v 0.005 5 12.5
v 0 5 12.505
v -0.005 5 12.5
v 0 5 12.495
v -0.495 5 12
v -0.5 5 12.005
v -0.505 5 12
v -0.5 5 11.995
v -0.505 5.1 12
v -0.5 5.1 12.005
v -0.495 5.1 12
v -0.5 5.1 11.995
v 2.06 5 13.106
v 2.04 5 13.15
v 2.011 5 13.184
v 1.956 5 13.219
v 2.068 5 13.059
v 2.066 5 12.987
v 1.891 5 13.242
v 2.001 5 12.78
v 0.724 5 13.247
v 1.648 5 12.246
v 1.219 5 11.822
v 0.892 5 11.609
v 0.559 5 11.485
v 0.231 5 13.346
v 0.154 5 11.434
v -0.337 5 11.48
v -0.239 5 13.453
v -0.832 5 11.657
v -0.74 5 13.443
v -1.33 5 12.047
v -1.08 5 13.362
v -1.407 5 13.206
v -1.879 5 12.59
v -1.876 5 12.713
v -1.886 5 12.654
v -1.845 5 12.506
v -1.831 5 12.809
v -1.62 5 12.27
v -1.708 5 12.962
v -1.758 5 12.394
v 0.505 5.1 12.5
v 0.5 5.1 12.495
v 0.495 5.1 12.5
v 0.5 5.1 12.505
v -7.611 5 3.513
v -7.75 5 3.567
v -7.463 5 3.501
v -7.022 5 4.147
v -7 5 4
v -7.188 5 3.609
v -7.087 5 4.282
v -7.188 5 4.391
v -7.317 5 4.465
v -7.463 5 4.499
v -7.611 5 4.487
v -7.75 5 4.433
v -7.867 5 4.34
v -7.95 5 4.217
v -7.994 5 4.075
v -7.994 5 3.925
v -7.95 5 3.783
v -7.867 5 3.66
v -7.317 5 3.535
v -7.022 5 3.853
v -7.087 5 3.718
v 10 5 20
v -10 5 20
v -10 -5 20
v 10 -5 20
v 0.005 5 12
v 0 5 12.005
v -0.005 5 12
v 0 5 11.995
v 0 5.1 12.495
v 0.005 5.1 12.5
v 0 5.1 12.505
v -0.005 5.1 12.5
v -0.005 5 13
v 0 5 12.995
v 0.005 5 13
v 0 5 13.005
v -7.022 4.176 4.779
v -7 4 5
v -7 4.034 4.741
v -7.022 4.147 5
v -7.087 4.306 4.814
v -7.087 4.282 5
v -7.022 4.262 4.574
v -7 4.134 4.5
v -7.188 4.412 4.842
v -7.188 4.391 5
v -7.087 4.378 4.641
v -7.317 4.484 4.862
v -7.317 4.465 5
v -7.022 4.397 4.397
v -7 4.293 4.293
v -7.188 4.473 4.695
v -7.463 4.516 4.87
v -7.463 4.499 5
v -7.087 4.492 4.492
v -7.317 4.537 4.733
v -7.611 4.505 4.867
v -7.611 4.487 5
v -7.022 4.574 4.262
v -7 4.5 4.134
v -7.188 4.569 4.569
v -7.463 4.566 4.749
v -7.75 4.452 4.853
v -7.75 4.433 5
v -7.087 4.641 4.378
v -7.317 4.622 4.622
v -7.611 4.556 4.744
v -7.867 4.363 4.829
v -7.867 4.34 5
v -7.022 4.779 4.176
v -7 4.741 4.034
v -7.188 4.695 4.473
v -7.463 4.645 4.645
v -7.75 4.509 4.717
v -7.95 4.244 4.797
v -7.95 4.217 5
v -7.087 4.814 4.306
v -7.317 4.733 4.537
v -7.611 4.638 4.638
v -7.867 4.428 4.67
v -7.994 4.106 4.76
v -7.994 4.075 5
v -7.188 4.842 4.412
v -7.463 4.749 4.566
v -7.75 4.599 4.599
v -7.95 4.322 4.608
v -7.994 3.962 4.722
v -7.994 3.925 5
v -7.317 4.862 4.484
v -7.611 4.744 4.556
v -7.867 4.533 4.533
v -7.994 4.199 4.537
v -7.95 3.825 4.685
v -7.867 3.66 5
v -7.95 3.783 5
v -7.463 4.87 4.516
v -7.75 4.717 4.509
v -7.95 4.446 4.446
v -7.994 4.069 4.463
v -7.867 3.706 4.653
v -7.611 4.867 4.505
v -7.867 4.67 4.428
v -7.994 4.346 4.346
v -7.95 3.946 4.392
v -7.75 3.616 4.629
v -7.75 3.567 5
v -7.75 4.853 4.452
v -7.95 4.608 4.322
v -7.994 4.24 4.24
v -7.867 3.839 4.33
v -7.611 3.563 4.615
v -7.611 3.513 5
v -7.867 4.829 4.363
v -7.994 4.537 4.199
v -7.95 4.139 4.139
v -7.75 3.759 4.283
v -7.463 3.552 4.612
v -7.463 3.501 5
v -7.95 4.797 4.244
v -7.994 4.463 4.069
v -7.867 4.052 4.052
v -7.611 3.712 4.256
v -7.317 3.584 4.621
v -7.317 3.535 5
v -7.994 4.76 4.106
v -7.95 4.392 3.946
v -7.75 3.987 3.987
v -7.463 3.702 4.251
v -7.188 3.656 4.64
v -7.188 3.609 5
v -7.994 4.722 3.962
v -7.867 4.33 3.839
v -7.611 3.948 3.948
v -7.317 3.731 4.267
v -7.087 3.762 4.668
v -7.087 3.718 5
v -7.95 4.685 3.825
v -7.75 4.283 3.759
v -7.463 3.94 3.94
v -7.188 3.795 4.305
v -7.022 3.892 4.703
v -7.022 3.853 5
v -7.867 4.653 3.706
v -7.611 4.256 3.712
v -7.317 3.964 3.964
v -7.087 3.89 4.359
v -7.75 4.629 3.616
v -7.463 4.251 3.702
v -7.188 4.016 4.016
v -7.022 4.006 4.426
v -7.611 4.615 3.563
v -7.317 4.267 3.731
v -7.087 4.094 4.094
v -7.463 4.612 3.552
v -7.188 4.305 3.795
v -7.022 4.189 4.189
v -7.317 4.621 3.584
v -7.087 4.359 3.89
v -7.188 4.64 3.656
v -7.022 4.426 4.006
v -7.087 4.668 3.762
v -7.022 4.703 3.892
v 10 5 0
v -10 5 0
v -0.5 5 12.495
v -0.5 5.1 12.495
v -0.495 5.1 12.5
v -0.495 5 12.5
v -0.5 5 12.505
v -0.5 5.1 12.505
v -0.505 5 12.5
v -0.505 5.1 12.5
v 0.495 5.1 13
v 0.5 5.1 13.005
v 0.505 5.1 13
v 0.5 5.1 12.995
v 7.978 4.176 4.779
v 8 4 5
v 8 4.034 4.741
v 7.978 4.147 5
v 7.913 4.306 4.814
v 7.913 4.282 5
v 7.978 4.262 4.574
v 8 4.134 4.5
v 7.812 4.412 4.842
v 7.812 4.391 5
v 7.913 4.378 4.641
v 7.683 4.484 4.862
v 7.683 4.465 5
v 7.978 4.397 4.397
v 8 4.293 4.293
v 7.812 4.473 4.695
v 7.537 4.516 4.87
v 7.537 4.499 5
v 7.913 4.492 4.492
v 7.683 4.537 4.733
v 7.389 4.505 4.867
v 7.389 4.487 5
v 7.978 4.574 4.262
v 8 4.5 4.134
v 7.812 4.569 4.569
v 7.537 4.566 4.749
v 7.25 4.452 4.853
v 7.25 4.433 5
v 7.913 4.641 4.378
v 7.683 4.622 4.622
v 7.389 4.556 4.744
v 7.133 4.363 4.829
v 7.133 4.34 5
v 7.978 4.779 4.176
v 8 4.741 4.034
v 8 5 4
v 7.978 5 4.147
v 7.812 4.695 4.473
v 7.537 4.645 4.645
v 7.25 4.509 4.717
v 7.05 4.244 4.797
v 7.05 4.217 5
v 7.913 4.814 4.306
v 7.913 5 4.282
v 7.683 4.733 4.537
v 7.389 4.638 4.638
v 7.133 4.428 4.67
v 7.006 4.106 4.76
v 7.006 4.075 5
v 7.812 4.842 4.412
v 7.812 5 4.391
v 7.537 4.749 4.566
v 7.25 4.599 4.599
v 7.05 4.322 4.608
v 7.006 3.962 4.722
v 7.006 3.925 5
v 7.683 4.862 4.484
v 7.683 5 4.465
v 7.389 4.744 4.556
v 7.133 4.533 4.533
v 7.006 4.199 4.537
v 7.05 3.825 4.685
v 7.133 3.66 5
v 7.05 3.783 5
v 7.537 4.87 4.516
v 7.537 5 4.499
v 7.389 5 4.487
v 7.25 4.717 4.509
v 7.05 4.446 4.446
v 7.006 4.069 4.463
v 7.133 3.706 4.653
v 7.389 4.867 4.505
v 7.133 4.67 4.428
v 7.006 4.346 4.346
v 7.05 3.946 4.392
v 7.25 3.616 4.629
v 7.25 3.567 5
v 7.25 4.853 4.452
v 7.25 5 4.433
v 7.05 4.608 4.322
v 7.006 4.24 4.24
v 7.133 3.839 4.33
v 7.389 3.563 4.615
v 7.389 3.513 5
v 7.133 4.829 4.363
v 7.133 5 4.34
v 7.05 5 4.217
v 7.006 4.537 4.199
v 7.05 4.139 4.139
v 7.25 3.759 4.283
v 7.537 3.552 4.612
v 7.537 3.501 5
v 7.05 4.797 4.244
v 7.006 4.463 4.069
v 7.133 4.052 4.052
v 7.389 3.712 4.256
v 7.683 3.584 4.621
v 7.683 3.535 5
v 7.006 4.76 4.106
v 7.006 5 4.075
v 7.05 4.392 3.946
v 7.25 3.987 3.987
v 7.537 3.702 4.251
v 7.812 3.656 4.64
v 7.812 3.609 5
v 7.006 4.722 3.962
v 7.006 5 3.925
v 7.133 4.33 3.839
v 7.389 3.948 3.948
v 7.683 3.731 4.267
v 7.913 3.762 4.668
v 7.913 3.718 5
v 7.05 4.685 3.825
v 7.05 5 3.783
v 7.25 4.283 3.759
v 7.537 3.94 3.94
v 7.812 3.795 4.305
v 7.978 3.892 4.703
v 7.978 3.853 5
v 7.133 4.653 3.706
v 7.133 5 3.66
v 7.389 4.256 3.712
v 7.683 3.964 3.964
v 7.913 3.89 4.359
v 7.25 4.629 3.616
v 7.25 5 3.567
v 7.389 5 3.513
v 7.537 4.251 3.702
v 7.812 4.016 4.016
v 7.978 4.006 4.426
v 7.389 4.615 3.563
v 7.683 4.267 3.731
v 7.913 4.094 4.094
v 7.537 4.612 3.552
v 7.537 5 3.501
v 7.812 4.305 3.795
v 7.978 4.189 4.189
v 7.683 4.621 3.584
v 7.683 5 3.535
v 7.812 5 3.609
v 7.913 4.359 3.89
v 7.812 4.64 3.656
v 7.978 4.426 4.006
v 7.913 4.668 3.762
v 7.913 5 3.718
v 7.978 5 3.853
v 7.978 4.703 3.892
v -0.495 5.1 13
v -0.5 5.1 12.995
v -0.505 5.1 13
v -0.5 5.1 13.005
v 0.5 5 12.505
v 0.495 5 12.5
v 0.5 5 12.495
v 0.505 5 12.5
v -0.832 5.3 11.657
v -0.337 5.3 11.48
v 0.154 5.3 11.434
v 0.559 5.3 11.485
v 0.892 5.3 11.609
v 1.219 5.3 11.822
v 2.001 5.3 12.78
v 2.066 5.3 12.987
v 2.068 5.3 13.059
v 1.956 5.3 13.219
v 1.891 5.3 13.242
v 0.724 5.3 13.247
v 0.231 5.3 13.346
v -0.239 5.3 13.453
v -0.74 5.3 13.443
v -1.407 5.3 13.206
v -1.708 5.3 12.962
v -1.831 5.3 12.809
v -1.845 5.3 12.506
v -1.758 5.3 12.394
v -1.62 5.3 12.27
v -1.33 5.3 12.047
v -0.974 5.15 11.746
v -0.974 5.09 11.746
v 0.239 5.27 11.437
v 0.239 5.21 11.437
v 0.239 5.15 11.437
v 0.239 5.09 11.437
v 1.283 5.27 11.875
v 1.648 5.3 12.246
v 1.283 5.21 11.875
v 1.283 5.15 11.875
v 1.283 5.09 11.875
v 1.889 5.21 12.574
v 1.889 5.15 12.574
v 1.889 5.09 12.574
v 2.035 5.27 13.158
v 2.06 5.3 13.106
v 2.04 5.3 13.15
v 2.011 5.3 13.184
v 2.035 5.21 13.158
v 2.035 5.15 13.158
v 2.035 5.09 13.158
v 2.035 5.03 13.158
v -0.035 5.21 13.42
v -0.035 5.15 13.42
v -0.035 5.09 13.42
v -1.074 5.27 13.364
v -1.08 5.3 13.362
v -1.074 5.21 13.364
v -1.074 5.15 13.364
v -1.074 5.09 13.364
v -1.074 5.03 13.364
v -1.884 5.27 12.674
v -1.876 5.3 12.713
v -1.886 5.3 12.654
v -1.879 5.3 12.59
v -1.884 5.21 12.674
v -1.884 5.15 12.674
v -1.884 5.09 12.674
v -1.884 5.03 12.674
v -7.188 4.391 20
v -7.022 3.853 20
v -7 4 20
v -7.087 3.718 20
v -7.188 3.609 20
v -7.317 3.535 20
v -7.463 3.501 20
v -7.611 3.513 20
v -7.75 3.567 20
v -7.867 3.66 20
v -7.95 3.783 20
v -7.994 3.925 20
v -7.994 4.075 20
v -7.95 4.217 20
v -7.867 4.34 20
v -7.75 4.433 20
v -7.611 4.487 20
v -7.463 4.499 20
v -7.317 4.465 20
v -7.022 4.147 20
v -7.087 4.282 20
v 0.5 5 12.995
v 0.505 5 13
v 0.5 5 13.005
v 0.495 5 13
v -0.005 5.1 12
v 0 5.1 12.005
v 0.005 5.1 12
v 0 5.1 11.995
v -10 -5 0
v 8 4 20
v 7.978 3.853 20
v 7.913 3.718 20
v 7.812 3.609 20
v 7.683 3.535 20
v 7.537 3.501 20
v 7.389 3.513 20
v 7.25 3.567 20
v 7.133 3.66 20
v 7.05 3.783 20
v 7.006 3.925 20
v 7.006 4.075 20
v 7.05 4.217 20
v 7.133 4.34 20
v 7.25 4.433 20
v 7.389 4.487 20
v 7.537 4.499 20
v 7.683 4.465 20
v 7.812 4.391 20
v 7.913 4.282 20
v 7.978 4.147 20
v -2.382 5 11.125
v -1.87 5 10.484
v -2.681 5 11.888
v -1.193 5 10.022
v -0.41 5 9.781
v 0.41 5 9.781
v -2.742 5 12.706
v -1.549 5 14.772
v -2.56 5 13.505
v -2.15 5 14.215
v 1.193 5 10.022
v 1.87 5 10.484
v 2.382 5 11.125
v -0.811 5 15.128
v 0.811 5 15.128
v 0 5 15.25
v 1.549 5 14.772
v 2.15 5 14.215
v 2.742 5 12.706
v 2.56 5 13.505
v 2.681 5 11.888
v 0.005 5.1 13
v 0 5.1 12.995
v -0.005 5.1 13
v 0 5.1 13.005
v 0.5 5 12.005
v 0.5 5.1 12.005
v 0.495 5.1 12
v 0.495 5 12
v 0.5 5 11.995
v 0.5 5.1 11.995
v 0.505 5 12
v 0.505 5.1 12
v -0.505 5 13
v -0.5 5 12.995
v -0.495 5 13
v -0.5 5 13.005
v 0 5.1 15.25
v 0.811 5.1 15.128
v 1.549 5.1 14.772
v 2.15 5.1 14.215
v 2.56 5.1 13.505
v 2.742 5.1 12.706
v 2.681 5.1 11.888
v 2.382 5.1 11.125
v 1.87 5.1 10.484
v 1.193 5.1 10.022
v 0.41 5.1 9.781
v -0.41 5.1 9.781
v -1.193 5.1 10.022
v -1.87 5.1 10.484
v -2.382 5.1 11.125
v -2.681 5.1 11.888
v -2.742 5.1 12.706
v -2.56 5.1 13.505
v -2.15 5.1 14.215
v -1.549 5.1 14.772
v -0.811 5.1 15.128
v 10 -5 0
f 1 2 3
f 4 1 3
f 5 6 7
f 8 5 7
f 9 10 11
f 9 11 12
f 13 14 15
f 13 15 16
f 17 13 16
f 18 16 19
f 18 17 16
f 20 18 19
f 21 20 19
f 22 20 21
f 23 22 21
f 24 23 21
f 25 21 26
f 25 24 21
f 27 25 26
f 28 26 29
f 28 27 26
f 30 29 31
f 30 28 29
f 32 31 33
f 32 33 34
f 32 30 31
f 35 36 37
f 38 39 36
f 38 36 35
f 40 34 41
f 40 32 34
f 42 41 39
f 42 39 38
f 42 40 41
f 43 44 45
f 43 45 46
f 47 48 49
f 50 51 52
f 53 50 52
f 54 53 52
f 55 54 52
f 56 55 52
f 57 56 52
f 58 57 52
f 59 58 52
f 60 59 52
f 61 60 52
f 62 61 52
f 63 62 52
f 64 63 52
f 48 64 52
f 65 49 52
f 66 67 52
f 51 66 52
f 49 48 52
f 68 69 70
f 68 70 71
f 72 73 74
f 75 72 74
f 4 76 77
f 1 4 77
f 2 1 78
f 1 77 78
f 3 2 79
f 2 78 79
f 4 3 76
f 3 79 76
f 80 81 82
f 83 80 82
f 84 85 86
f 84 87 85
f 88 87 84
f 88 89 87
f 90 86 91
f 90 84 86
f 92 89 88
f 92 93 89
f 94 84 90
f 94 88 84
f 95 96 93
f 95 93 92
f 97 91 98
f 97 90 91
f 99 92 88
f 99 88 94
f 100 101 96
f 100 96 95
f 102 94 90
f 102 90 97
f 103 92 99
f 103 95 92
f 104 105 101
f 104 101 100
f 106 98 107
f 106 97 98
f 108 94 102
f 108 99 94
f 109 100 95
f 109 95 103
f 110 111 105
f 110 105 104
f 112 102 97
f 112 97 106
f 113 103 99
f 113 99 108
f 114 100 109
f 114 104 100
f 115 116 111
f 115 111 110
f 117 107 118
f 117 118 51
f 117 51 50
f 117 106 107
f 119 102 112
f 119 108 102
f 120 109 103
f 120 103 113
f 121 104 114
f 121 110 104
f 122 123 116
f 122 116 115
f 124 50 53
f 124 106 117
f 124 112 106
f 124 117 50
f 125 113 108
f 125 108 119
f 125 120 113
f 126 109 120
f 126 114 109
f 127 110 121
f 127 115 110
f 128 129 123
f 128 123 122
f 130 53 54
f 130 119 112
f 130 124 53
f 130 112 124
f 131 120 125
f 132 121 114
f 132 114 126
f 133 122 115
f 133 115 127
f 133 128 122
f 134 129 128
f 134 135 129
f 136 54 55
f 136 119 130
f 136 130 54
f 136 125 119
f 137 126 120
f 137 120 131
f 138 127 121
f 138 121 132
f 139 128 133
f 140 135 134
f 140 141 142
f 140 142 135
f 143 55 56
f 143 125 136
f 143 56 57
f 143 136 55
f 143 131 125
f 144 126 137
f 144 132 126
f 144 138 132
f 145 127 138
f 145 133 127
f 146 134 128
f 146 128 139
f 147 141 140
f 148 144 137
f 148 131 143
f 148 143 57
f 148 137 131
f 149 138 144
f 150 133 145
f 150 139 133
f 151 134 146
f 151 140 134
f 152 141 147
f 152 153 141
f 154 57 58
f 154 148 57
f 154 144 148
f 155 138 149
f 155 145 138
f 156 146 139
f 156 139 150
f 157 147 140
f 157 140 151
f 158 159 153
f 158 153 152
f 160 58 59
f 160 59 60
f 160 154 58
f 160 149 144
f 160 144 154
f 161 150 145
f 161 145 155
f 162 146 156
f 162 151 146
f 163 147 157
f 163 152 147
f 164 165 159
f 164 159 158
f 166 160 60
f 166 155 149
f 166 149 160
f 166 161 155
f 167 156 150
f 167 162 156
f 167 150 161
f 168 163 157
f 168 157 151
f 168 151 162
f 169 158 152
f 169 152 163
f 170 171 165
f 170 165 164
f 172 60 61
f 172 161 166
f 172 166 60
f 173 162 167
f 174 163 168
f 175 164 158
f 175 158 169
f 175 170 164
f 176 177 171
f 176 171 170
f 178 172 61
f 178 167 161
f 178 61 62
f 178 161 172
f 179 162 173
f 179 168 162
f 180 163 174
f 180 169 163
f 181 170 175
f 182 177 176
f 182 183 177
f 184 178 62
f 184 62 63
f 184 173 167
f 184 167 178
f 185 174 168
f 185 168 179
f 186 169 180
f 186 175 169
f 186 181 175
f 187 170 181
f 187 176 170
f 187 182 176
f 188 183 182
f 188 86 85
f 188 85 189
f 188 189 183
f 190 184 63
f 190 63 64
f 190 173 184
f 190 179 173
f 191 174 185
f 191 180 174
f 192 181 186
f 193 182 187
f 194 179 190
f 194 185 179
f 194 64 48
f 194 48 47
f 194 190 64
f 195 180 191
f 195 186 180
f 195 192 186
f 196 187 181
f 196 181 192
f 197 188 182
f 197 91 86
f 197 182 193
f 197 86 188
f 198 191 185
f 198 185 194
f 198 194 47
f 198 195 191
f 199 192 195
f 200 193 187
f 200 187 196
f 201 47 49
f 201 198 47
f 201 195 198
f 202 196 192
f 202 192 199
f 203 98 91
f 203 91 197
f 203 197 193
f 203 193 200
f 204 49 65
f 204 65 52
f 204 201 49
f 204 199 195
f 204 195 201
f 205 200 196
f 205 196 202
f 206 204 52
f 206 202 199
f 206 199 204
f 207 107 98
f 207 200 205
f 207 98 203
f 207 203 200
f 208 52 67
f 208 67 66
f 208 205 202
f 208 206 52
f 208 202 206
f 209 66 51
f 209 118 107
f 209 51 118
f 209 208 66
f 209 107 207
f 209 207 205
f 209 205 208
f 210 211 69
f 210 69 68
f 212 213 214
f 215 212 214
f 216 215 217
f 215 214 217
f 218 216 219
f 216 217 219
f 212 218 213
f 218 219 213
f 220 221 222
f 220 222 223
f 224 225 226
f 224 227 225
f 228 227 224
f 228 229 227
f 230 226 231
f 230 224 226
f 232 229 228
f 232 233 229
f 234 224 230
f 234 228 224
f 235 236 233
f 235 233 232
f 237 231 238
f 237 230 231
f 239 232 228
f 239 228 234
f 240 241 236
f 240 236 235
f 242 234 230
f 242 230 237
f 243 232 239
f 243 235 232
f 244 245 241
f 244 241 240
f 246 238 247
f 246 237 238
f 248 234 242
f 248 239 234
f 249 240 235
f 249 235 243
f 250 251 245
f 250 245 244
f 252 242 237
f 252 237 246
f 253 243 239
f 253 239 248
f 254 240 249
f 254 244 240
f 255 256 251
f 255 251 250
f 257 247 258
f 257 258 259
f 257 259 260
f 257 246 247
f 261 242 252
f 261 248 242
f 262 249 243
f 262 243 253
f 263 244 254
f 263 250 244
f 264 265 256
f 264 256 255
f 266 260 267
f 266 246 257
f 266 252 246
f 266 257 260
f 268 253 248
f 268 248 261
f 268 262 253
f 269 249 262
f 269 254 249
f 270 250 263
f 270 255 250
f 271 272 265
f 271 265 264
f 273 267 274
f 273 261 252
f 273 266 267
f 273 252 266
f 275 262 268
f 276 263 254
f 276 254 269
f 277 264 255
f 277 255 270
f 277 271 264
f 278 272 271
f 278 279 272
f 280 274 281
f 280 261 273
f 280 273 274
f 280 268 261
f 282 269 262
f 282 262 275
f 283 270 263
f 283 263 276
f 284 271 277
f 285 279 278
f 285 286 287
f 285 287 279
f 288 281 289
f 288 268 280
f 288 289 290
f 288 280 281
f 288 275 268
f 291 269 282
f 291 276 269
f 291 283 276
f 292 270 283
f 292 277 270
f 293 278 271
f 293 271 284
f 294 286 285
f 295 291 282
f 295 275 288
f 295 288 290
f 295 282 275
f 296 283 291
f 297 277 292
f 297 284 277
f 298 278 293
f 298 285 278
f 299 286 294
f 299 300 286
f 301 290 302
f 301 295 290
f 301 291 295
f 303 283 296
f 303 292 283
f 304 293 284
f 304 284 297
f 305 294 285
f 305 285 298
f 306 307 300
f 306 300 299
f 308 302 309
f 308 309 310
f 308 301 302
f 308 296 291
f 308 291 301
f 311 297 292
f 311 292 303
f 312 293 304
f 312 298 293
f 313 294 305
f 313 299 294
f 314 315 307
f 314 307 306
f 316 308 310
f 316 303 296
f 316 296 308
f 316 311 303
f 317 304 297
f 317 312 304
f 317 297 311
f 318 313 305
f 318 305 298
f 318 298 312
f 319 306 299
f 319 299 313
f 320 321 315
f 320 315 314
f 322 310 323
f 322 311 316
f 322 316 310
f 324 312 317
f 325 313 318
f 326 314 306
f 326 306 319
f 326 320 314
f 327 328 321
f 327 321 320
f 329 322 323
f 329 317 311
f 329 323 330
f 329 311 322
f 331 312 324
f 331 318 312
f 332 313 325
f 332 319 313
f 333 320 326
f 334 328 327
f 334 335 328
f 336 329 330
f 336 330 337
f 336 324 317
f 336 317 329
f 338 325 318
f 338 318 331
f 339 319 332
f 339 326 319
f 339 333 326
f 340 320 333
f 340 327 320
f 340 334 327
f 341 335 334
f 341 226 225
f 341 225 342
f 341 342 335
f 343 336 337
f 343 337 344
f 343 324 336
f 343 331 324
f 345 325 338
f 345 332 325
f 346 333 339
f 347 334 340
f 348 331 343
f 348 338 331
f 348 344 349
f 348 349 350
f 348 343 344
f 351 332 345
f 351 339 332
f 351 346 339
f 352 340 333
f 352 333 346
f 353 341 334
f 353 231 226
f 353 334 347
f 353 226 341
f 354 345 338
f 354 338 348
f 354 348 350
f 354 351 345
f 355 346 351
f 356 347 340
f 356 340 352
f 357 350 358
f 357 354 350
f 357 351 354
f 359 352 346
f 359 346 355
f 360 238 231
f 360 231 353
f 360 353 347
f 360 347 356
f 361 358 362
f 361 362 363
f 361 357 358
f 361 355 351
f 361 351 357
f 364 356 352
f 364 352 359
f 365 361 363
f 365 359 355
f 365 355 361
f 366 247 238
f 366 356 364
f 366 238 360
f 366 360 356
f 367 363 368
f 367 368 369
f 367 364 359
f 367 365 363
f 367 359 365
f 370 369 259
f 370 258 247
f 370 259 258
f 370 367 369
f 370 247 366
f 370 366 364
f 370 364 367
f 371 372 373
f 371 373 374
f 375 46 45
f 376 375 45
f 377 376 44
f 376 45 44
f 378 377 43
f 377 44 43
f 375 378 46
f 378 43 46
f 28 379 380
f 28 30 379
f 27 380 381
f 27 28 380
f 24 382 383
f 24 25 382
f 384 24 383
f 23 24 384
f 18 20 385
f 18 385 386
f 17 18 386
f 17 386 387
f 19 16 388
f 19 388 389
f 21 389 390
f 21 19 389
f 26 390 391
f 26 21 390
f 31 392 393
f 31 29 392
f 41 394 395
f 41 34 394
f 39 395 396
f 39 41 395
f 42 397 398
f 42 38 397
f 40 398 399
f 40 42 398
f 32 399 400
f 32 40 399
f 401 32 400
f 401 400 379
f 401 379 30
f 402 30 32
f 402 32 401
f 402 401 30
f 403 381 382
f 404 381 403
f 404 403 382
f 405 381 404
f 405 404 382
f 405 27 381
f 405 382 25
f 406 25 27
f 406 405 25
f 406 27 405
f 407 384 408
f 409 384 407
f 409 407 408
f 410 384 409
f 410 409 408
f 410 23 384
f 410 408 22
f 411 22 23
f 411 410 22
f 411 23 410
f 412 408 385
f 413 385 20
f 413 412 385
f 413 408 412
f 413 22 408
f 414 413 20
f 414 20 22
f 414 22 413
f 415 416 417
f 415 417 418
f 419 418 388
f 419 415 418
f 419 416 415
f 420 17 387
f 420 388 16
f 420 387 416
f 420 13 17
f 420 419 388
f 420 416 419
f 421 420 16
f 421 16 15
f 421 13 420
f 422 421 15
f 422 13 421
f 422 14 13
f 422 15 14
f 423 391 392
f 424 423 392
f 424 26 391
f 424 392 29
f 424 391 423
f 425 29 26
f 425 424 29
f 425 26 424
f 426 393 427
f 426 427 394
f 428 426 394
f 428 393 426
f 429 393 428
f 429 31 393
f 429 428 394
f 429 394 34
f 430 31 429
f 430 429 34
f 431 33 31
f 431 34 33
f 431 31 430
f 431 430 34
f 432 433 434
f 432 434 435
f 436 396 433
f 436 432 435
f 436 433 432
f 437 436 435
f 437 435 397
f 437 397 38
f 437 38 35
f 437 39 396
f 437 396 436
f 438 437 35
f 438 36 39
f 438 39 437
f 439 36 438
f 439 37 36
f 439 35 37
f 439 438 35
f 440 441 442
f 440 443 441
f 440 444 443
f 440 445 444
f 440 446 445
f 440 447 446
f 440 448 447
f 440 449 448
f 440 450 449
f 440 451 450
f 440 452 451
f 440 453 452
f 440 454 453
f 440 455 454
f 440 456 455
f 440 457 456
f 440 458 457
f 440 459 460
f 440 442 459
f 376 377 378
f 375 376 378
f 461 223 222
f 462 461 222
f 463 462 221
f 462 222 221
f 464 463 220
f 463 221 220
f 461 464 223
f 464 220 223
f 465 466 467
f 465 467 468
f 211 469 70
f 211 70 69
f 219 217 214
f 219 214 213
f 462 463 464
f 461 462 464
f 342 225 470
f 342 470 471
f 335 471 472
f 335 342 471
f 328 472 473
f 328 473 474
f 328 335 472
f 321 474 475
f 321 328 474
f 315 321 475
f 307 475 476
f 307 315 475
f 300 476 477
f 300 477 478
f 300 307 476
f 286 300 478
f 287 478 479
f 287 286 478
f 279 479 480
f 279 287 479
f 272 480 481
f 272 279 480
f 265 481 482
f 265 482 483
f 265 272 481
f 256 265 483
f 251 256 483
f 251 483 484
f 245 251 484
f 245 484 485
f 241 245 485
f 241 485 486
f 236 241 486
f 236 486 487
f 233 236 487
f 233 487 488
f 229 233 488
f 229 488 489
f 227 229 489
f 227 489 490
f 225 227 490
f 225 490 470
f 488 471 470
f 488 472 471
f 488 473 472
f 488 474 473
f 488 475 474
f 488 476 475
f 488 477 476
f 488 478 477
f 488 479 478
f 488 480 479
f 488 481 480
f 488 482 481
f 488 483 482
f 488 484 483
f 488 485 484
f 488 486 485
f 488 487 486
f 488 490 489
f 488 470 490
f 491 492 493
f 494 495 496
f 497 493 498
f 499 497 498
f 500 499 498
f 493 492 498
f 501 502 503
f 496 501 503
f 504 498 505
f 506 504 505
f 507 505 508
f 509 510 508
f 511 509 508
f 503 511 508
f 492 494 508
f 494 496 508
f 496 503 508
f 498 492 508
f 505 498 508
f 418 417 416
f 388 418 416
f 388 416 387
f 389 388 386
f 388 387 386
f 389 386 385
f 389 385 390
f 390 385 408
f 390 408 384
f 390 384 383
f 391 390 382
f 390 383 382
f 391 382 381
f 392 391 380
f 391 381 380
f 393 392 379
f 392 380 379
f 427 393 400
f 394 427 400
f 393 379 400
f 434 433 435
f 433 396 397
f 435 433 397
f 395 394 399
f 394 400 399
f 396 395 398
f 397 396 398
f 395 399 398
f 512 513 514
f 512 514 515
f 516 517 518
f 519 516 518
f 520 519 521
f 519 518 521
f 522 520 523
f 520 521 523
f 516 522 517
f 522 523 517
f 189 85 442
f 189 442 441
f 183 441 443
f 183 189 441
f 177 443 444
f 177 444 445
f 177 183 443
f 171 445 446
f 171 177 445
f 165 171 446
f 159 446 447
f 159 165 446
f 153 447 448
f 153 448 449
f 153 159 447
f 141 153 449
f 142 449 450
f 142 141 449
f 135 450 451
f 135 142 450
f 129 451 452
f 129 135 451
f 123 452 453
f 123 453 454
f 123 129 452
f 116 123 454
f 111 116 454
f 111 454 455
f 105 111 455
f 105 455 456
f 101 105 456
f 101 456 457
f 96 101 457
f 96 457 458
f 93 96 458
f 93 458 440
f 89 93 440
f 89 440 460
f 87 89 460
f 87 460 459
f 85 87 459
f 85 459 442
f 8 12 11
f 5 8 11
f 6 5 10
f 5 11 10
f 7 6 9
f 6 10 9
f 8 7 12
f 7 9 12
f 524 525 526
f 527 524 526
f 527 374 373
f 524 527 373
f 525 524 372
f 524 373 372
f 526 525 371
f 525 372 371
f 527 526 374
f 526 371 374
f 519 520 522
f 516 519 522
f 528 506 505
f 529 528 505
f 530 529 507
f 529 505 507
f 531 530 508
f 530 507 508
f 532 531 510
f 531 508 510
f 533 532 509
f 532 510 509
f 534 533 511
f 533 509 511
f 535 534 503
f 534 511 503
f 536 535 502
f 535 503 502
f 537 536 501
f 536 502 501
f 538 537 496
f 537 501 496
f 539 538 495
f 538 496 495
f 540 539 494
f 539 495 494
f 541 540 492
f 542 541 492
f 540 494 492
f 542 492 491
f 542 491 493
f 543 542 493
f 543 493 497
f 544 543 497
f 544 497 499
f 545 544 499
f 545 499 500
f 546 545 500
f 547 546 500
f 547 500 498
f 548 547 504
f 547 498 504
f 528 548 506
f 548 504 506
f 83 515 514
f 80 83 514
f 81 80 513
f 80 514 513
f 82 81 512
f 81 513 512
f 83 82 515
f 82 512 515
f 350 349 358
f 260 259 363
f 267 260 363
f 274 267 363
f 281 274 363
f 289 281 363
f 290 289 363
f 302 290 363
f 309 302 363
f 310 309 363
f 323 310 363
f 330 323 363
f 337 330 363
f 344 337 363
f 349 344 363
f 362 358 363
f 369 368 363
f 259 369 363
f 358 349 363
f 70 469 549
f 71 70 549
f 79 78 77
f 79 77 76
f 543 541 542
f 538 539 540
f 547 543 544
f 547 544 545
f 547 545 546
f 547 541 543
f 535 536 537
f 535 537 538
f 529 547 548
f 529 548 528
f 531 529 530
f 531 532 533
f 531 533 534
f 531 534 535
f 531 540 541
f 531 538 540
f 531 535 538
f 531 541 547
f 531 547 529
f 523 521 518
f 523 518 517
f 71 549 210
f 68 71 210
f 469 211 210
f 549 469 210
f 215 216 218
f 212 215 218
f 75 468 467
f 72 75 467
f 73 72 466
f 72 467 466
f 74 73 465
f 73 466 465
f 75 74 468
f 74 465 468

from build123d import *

# Parameters (mm, degrees)
SKETCH1_W             = 20
SKETCH1_H             = 10
BOSS_EXTRUDE1_DEPTH   = 20
SKETCH2_R             = 0.5
SKETCH5_R             = 2.75
BOSS_EXTRUDE4_DEPTH   = 0.1
SKETCH8_R             = 0.005
BOSS_EXTRUDE5_DEPTH   = 0.1
BOSS_EXTRUDE5_2_DEPTH = 0.1
BOSS_EXTRUDE5_3_DEPTH = 0.1
BOSS_EXTRUDE5_4_DEPTH = 0.1
BOSS_EXTRUDE5_5_DEPTH = 0.1
BOSS_EXTRUDE5_6_DEPTH = 0.1
BOSS_EXTRUDE5_7_DEPTH = 0.1
BOSS_EXTRUDE5_8_DEPTH = 0.1
BOSS_EXTRUDE5_9_DEPTH = 0.1
SLICE_2_DEPTH         = 0.3


with BuildPart() as part:
    # Sketch1 → Boss-Extrude1 (new body)
    with BuildSketch(Plane.XY):
        Rectangle(SKETCH1_W, SKETCH1_H)
    extrude(amount=BOSS_EXTRUDE1_DEPTH)


with BuildPart() as body_2:
    # ag/agcl electrodes: sweep along a path in Sketch3
    with BuildLine(Plane(origin=(7.5, 0, 0), x_dir=(0, 0, -1), z_dir=(1, 0, 0))) as ag_agcl_electrodes_path:
        Line((-20, 4), (-5, 4))
        ThreePointArc((-5, 4), (-4.292893219, 4.292893219), (-4, 5))
    # Sketch2 → ag/agcl electrodes (sweep)
    with BuildSketch(Plane.XY.offset(20)):
        with Locations((-7.5, 4)):
            Circle(SKETCH2_R)
        with Locations((7.5, 4)):
            Circle(SKETCH2_R)
    sweep(path=ag_agcl_electrodes_path.line)


with BuildPart() as body_3:
    # Sketch5 → Boss-Extrude4 (new body)
    with BuildSketch(Plane(origin=(0, 5, 0), x_dir=(1, 0, 0), z_dir=(0, 1, 0))):
        with Locations(Location((0, -12.5, 0), (0, 0, 270))):
            Circle(SKETCH5_R)
    extrude(amount=BOSS_EXTRUDE4_DEPTH)


with BuildPart() as body_4:
    # Sketch8 → Boss-Extrude5 (new body)
    with BuildSketch(Plane(origin=(0, 5.1, 0), x_dir=(-1, 0, 0), z_dir=(0, -1, 0))):
        with Locations(Location((0, -12.5, 0), (0, 0, 90))):
            Circle(SKETCH8_R)
    extrude(amount=BOSS_EXTRUDE5_DEPTH)


with BuildPart() as body_5:
    # Sketch8 → Boss-Extrude5 2 (new body)
    with BuildSketch(Plane(origin=(0, 5.1, 0), x_dir=(-1, 0, 0), z_dir=(0, -1, 0))):
        with Locations(Location((0.5, -12.5, 0), (0, 0, 90))):
            Circle(SKETCH8_R)
    extrude(amount=BOSS_EXTRUDE5_2_DEPTH)


with BuildPart() as body_6:
    # Sketch8 → Boss-Extrude5 3 (new body)
    with BuildSketch(Plane(origin=(0, 5.1, 0), x_dir=(-1, 0, 0), z_dir=(0, -1, 0))):
        with Locations(Location((0.5, -12, 0), (0, 0, 90))):
            Circle(SKETCH8_R)
    extrude(amount=BOSS_EXTRUDE5_3_DEPTH)


with BuildPart() as body_7:
    # Sketch8 → Boss-Extrude5 4 (new body)
    with BuildSketch(Plane(origin=(0, 5.1, 0), x_dir=(-1, 0, 0), z_dir=(0, -1, 0))):
        with Locations(Location((0, -12, 0), (0, 0, 90))):
            Circle(SKETCH8_R)
    extrude(amount=BOSS_EXTRUDE5_4_DEPTH)


with BuildPart() as body_8:
    # Sketch8 → Boss-Extrude5 5 (new body)
    with BuildSketch(Plane(origin=(0, 5.1, 0), x_dir=(-1, 0, 0), z_dir=(0, -1, 0))):
        with Locations(Location((0.5, -13, 0), (0, 0, 270))):
            Circle(SKETCH8_R)
    extrude(amount=BOSS_EXTRUDE5_5_DEPTH)


with BuildPart() as body_9:
    # Sketch8 → Boss-Extrude5 6 (new body)
    with BuildSketch(Plane(origin=(0, 5.1, 0), x_dir=(-1, 0, 0), z_dir=(0, -1, 0))):
        with Locations(Location((0, -13, 0), (0, 0, 270))):
            Circle(SKETCH8_R)
    extrude(amount=BOSS_EXTRUDE5_6_DEPTH)


with BuildPart() as body_10:
    # Sketch8 → Boss-Extrude5 7 (new body)
    with BuildSketch(Plane(origin=(0, 5.1, 0), x_dir=(-1, 0, 0), z_dir=(0, -1, 0))):
        with Locations(Location((-0.5, -13, 0), (0, 0, 90))):
            Circle(SKETCH8_R)
    extrude(amount=BOSS_EXTRUDE5_7_DEPTH)


with BuildPart() as body_11:
    # Sketch8 → Boss-Extrude5 8 (new body)
    with BuildSketch(Plane(origin=(0, 5.1, 0), x_dir=(-1, 0, 0), z_dir=(0, -1, 0))):
        with Locations(Location((-0.5, -12, 0), (0, 0, 270))):
            Circle(SKETCH8_R)
    extrude(amount=BOSS_EXTRUDE5_8_DEPTH)


with BuildPart() as body_12:
    # Sketch8 → Boss-Extrude5 9 (new body)
    with BuildSketch(Plane(origin=(0, 5.1, 0), x_dir=(-1, 0, 0), z_dir=(0, -1, 0))):
        with Locations(Location((-0.5, -12.5, 0), (0, 0, 270))):
            Circle(SKETCH8_R)
    extrude(amount=BOSS_EXTRUDE5_9_DEPTH)


with BuildPart() as body_13:
    # Sketch4 → slice 2 (new body)
    with BuildSketch(Plane(origin=(0, 5, 0), x_dir=(1, 0, 0), z_dir=(0, 1, 0))):
        with BuildLine():
            add(Edge.make_bspline(
                [(-1.329786825, -12.04709664), (-1.196342031, -11.939424685), (-0.824147777, -11.548957834), (0.251281573, -11.322574475), (1.372606671, -11.746573561), (2.652909809, -13.571837262), (0.780549472, -13.104467787), (-0.122057097, -13.506347246), (-0.994791107, -13.460960152), (-1.586432094, -13.116889112), (-2.086144249, -12.539169772), (-1.569499382, -12.240512354), (-1.329786825, -12.04709664)],
                knots=[0, 0, 0, 0, 0.049562645, 0.182817887, 0.303261475, 0.461561344, 0.613381106, 0.684437877, 0.79516613, 0.866564728, 0.910968514, 1, 1, 1, 1], degree=3))
        make_face()
    extrude(amount=SLICE_2_DEPTH)


solid = Compound([part.part, body_2.part, body_3.part, body_4.part, body_5.part, body_6.part, body_7.part, body_8.part, body_9.part, body_10.part, body_11.part, body_12.part, body_13.part])
